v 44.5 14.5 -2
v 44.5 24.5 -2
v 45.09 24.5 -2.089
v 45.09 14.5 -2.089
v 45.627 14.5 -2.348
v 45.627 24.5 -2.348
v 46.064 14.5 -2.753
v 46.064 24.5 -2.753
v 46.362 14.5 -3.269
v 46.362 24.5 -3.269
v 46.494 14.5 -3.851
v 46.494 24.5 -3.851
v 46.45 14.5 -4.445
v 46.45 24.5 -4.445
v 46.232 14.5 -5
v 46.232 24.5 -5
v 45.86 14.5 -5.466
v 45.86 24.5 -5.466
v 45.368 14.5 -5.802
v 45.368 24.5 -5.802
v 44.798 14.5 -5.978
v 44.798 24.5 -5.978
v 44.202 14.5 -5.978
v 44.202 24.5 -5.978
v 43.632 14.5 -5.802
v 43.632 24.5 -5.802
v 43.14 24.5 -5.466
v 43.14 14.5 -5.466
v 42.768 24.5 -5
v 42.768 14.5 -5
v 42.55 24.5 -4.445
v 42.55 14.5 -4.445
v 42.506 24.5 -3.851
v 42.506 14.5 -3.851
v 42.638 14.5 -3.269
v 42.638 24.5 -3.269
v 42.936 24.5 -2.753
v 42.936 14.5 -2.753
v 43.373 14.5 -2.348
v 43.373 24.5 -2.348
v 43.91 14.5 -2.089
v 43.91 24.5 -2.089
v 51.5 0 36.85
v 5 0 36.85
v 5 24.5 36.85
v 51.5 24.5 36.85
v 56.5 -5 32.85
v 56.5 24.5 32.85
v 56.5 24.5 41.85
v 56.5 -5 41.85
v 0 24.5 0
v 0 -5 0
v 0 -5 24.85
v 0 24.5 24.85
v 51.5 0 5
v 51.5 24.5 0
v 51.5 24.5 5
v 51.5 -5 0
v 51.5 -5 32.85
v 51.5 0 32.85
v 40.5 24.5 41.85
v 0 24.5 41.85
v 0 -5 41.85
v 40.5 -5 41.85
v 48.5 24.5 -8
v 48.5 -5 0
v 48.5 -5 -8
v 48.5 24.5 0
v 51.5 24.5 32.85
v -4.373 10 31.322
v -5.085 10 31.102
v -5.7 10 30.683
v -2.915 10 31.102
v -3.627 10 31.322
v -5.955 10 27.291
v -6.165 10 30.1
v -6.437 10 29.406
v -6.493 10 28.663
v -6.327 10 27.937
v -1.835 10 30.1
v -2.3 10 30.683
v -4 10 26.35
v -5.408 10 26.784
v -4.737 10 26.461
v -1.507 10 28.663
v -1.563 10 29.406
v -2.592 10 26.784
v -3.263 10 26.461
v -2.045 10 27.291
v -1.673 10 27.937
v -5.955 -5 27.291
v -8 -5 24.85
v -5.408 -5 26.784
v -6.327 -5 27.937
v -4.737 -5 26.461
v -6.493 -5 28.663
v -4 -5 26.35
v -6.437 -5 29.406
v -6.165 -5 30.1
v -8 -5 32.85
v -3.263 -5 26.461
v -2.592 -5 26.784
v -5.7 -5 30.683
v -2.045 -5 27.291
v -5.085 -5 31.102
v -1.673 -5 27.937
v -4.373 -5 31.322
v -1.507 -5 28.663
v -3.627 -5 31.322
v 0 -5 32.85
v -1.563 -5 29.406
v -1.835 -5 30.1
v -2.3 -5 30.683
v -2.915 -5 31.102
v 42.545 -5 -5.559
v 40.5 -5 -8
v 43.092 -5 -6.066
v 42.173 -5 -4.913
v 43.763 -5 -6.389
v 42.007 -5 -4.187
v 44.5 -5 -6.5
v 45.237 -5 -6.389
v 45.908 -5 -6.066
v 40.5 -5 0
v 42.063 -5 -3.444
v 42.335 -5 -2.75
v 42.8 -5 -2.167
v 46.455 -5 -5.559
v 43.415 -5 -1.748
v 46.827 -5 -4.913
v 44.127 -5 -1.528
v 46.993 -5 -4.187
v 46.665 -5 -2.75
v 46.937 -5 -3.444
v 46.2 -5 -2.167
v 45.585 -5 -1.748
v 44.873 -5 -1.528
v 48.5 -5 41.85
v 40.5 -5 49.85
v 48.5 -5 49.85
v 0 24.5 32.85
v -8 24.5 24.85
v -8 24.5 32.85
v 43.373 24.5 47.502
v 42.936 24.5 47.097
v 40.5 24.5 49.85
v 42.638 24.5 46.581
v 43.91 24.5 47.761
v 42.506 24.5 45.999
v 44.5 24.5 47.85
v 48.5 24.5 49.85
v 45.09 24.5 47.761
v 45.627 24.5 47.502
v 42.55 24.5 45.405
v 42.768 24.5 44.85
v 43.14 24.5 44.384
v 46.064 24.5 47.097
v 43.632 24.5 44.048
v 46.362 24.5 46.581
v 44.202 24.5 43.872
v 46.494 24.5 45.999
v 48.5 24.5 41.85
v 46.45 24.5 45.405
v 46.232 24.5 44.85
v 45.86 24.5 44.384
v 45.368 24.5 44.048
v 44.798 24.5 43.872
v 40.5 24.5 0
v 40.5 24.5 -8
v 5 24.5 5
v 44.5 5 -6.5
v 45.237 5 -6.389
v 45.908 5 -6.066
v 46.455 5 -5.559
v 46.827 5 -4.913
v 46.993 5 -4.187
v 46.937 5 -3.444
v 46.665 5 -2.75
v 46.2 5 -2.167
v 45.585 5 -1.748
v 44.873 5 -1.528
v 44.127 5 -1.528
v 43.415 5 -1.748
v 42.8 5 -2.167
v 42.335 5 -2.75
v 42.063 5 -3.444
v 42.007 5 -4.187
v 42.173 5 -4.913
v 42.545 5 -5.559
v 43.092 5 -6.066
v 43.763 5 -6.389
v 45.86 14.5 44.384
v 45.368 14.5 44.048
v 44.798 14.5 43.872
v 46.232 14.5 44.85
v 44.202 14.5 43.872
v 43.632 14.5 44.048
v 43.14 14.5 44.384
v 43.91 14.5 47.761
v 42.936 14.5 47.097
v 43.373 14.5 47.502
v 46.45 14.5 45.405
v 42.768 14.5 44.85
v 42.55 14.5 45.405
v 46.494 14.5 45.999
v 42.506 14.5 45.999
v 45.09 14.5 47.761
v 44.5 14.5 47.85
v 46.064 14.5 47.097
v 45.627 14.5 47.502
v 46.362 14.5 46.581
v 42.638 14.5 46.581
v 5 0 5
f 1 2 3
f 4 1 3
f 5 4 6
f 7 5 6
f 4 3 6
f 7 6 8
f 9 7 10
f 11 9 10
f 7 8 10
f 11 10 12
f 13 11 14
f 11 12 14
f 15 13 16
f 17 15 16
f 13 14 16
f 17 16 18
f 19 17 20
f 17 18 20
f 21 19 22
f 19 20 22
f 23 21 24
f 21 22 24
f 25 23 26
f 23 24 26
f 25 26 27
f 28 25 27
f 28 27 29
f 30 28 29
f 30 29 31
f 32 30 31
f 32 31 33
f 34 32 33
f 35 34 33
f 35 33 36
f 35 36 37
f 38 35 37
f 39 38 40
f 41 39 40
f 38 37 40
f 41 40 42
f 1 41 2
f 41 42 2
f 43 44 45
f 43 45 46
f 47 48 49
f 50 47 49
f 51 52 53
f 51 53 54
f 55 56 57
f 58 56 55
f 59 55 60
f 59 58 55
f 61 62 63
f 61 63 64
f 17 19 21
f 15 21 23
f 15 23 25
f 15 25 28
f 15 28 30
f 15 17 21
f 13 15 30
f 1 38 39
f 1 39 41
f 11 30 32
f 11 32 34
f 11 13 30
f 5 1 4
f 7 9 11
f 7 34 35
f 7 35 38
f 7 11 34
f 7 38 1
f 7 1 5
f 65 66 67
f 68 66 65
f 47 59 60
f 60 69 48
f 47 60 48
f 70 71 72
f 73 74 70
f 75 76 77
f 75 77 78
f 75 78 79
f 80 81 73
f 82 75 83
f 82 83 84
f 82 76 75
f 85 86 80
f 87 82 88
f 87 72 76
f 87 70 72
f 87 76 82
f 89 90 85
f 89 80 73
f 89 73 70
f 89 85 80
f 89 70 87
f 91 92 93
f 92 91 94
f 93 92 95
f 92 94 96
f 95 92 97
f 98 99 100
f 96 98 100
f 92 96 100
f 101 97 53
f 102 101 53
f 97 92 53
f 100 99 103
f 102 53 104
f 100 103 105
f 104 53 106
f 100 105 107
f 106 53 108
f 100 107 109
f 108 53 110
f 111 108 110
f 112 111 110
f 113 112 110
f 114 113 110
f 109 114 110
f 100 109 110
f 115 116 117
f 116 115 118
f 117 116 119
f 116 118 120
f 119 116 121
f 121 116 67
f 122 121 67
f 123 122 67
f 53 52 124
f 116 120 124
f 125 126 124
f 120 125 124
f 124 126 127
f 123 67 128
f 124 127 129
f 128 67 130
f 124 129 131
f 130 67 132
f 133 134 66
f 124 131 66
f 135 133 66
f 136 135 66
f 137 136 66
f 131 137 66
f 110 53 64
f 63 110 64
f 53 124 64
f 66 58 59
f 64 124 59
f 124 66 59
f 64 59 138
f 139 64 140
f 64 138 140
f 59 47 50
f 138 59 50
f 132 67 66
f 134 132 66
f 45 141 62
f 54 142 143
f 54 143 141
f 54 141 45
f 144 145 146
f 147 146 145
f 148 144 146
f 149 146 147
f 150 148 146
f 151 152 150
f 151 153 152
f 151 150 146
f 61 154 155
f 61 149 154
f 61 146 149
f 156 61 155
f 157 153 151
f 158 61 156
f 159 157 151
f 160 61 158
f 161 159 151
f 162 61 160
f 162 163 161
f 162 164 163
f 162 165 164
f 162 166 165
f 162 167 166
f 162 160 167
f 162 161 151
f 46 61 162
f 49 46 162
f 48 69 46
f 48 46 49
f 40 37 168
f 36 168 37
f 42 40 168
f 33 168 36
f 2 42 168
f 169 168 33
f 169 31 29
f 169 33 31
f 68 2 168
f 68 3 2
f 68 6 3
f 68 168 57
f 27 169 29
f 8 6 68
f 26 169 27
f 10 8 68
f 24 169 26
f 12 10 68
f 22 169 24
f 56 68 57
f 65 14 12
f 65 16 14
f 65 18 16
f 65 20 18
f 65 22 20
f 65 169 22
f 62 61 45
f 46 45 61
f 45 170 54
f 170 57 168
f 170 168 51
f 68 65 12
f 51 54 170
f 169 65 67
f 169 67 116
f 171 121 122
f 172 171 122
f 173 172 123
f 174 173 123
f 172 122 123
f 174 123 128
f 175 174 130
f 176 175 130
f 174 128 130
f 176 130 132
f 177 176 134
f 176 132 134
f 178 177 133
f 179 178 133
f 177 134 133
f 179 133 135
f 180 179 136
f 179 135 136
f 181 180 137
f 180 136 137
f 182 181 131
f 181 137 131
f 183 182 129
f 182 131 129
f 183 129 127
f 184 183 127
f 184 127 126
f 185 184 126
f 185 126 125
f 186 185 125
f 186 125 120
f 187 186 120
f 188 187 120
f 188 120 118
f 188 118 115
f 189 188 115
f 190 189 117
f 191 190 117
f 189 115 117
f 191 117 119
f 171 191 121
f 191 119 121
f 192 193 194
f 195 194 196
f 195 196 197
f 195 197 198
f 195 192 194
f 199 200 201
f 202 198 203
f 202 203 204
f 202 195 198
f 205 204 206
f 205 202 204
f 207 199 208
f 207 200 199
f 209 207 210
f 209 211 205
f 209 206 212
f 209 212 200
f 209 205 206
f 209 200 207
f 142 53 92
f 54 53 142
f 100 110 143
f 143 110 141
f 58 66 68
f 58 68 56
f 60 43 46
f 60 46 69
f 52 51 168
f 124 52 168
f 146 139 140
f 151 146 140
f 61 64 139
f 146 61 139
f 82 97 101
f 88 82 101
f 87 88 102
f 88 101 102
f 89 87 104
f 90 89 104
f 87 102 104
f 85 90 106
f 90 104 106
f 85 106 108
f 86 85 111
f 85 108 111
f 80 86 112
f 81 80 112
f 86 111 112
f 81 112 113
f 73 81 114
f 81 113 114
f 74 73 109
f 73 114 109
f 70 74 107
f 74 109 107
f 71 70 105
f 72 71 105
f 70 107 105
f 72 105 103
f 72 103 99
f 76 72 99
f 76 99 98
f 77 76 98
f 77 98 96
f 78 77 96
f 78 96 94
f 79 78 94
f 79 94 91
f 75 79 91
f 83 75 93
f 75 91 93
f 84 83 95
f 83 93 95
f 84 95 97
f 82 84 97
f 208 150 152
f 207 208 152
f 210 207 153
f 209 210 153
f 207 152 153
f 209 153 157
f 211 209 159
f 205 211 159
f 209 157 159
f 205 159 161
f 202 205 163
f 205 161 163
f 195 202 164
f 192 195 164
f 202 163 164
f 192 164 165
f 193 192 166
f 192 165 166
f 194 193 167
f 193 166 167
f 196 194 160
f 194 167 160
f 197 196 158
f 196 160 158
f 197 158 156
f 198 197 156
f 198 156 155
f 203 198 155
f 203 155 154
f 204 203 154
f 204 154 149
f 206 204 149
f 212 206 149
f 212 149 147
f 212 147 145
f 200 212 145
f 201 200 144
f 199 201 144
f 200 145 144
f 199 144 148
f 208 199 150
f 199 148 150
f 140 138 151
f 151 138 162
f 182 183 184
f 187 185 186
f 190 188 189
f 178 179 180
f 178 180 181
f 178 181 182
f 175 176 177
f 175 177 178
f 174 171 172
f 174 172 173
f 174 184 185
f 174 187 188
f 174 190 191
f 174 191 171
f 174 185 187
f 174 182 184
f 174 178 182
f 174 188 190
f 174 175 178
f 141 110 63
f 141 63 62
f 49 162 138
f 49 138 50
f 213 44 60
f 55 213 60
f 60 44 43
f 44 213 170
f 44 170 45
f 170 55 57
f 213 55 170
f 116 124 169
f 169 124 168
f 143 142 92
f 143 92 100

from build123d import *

# Parameters (mm, degrees)
BOSS_EXTRUDE1_DEPTH  = 24.5
SKETCH2_W            = 103
SKETCH2_H            = 41.85
BOSS_EXTRUDE2_DEPTH  = 5
SKETCH3_W            = 46.5
SKETCH3_H            = 27.85
CUT_EXTRUDE1_DEPTH   = 26
SKETCH7_W            = 8
SKETCH7_H            = 3
BOSS_EXTRUDE3_DEPTH  = 8
SKETCH8_R            = 2.5
CUT_EXTRUDE2_DEPTH   = 8
SKETCH9_W            = 8
SKETCH9_H            = 3
BOSS_EXTRUDE4_DEPTH  = 8
SKETCH10_R           = 2.5
CUT_EXTRUDE3_DEPTH   = 8
SKETCH12_W           = 11.5
SKETCH12_H           = 5
CUT_EXTRUDE4_DEPTH   = 8
SKETCH14_W           = 8
SKETCH14_H           = 3
BOSS_EXTRUDE5_DEPTH  = 8
SKETCH15_R           = 2.5
CUT_EXTRUDE5_DEPTH   = 8
SKETCH16_W           = 8
SKETCH16_H           = 29.5
BOSS_EXTRUDE6_DEPTH  = 8
SKETCH17_W           = 14
SKETCH17_H           = 29.5
BOSS_EXTRUDE7_DEPTH  = 8
SKETCH18_R           = 2
CUT_EXTRUDE6_DEPTH   = 10
SKETCH19_W           = 8
SKETCH19_H           = 29.5
BOSS_EXTRUDE8_DEPTH  = 8
SKETCH20_W           = 13
SKETCH20_H           = 13
BOSS_EXTRUDE9_DEPTH  = 88
CUT_EXTRUDE8_DEPTH   = 48
SKETCH23_R           = 2.5
CUT_EXTRUDE9_DEPTH   = 10
SKETCH25_W           = 8
SKETCH25_H           = 3
CUT_EXTRUDE10_DEPTH  = 8
SKETCH27_W           = 8
SKETCH27_H           = 29.5
BOSS_EXTRUDE11_DEPTH = 8
SKETCH28_R           = 2.5
CUT_EXTRUDE12_DEPTH  = 15
SKETCH29_W           = 13
SKETCH29_H           = 13
CUT_EXTRUDE13_DEPTH  = 88
SKETCH30_W           = 14
SKETCH30_H           = 8
CUT_EXTRUDE14_DEPTH  = 147


with BuildPart() as part:
    # Sketch1 → Boss-Extrude1 (new body)
    with BuildSketch(Plane(origin=(0, 0, 0), x_dir=(1, 0, 0), z_dir=(0, 1, 0))):
        Polygon((0, 0), (51.5, 0), (51.5, -5), (5, -5), (5, -36.85), (51.5, -36.85), (51.5, -32.85), (56.5, -32.85), (56.5, -41.85), (0, -41.85), align=None)
    extrude(amount=BOSS_EXTRUDE1_DEPTH)

    # Sketch2 → Boss-Extrude2 (add)
    with BuildSketch(Plane.XZ):
        with Locations((51.5, 20.925)):
            Rectangle(SKETCH2_W, SKETCH2_H)
    extrude(amount=BOSS_EXTRUDE2_DEPTH)

    # Sketch3 → Cut-Extrude1 (cut)
    with BuildSketch(Plane(origin=(0, 0, 0), x_dir=(1, 0, 0), z_dir=(0, 1, 0))):
        with Locations((74.75, -18.925)):
            Rectangle(SKETCH3_W, SKETCH3_H)
    extrude(amount=-CUT_EXTRUDE1_DEPTH, mode=Mode.SUBTRACT)

    # Sketch7 → Boss-Extrude3 (add)
    with BuildSketch(Plane.XY.offset(41.85)):
        with Locations((4, -3.5)):
            Rectangle(SKETCH7_W, SKETCH7_H)
    extrude(amount=BOSS_EXTRUDE3_DEPTH)

    # Sketch8 → Cut-Extrude2 (cut)
    with BuildSketch(Plane(origin=(0, -2, 0), x_dir=(1, 0, 0), z_dir=(0, 1, 0))):
        with Locations(Location((4, -45.85, 0), (0, 0, 270))):
            Circle(SKETCH8_R)
    extrude(amount=-CUT_EXTRUDE2_DEPTH, mode=Mode.SUBTRACT)

    # Sketch9 → Boss-Extrude4 (add)
    with BuildSketch(Plane(origin=(0, 0, 0), x_dir=(-1, 0, 0), z_dir=(0, 0, -1))):
        with Locations((-99, -3.5)):
            Rectangle(SKETCH9_W, SKETCH9_H)
    extrude(amount=BOSS_EXTRUDE4_DEPTH)

    # Sketch10 → Cut-Extrude3 (cut)
    with BuildSketch(Plane(origin=(0, -2, 0), x_dir=(1, 0, 0), z_dir=(0, 1, 0))):
        with Locations(Location((99, 3.996680608, 0), (0, 0, 270))):
            Circle(SKETCH10_R)
    extrude(amount=-CUT_EXTRUDE3_DEPTH, mode=Mode.SUBTRACT)

    # Sketch12 → Cut-Extrude4 (cut)
    with BuildSketch(Plane(origin=(0, 0, 0), x_dir=(1, 0, 0), z_dir=(0, 1, 0))):
        with Locations((89.25, -2.5)):
            Rectangle(SKETCH12_W, SKETCH12_H)
    extrude(amount=-CUT_EXTRUDE4_DEPTH, mode=Mode.SUBTRACT)

    # Sketch14 → Boss-Extrude5 (add)
    with BuildSketch(Plane(origin=(0, 0, 0), x_dir=(-1, 0, 0), z_dir=(0, 0, -1))):
        with Locations((-79.5, -3.5)):
            Rectangle(SKETCH14_W, SKETCH14_H)
    extrude(amount=BOSS_EXTRUDE5_DEPTH)

    # Sketch15 → Cut-Extrude5 (cut)
    with BuildSketch(Plane(origin=(0, -2, 0), x_dir=(1, 0, 0), z_dir=(0, 1, 0))):
        with Locations(Location((79.5, 4, 0), (0, 0, 270))):
            Circle(SKETCH15_R)
    extrude(amount=-CUT_EXTRUDE5_DEPTH, mode=Mode.SUBTRACT)

    # Sketch16 → Boss-Extrude6 (add)
    with BuildSketch(Plane(origin=(0, 0, 0), x_dir=(-1, 0, 0), z_dir=(0, 0, -1))):
        with Locations((-44.5, 9.75)):
            Rectangle(SKETCH16_W, SKETCH16_H)
    extrude(amount=BOSS_EXTRUDE6_DEPTH)

    # Sketch17 → Boss-Extrude7 (add)
    with BuildSketch(Plane.XY.offset(41.85)):
        with Locations((41.5, 9.75)):
            Rectangle(SKETCH17_W, SKETCH17_H)
    extrude(amount=BOSS_EXTRUDE7_DEPTH)

    # Sketch18 → Cut-Extrude6 (cut)
    with BuildSketch(Plane(origin=(0, 24.5, 0), x_dir=(1, 0, 0), z_dir=(0, 1, 0))):
        with Locations(Location((44.5, 4, 0), (0, 0, 270))):
            Circle(SKETCH18_R)
        with Locations(Location((44.5, -45.85, 0), (0, 0, 270))):
            Circle(SKETCH18_R)
    extrude(amount=-CUT_EXTRUDE6_DEPTH, mode=Mode.SUBTRACT)

    # Sketch19 → Boss-Extrude8 (add)
    with BuildSketch(Plane.ZY.offset(-34.5)):
        with Locations((45.85, 9.75)):
            Rectangle(SKETCH19_W, SKETCH19_H)
    extrude(amount=BOSS_EXTRUDE8_DEPTH)

    # Sketch20 → Boss-Extrude9 (add)
    with BuildSketch(Plane(origin=(0, 24.5, 0), x_dir=(1, 0, 0), z_dir=(0, 1, 0))):
        with Locations((33, -43.35)):
            Rectangle(SKETCH20_W, SKETCH20_H)
    extrude(amount=BOSS_EXTRUDE9_DEPTH)

    # Sketch22 → Cut-Extrude8 (cut)
    with BuildSketch(Plane(origin=(0, 0, 0), x_dir=(1, 0, 0), z_dir=(0, 1, 0))):
        Polygon((103, 0), (103, 8), (51.5, 8), (51.5, -32.85), (56.5, -32.85), (98, -32.85), (98, -5), (95, -5), (95, 0), align=None)
        Polygon((103, -41.85), (103, -32.85), (98, -32.85), (56.5, -32.85), (56.5, -41.85), align=None)
        Polygon((103, -32.85), (103, 0), (95, 0), (95, -5), (98, -5), (98, -32.85), align=None)
    extrude(amount=-CUT_EXTRUDE8_DEPTH, mode=Mode.SUBTRACT)

    # Sketch23 → Cut-Extrude9 (cut)
    with BuildSketch(Plane.XZ.offset(5)):
        with Locations(Location((44.5, -4, 0), (0, 0, 270))):
            Circle(SKETCH23_R)
    extrude(amount=-CUT_EXTRUDE9_DEPTH, mode=Mode.SUBTRACT)

    # Sketch25 → Cut-Extrude10 (cut)
    with BuildSketch(Plane.XY.offset(49.85)):
        with Locations((4, -3.5)):
            Rectangle(SKETCH25_W, SKETCH25_H)
    extrude(amount=-CUT_EXTRUDE10_DEPTH, mode=Mode.SUBTRACT)

    # Sketch27 → Boss-Extrude11 (add)
    with BuildSketch(Plane.ZY):
        with Locations((28.85, 9.75)):
            Rectangle(SKETCH27_W, SKETCH27_H)
    extrude(amount=BOSS_EXTRUDE11_DEPTH)

    # Sketch28 → Cut-Extrude12 (cut)
    with BuildSketch(Plane.XZ.offset(5)):
        with Locations(Location((-4, 28.85, 0), (0, 0, 270))):
            Circle(SKETCH28_R)
    extrude(amount=-CUT_EXTRUDE12_DEPTH, mode=Mode.SUBTRACT)

    # Sketch29 → Cut-Extrude13 (cut)
    with BuildSketch(Plane(origin=(0, 112.5, 0), x_dir=(1, 0, 0), z_dir=(0, 1, 0))):
        with Locations((33, -43.35)):
            Rectangle(SKETCH29_W, SKETCH29_H)
    extrude(amount=-CUT_EXTRUDE13_DEPTH, mode=Mode.SUBTRACT)

    # Sketch30 → Cut-Extrude14 (cut)
    with BuildSketch(Plane.XZ.offset(5)):
        with Locations((33.5, 45.85)):
            Rectangle(SKETCH30_W, SKETCH30_H)
    extrude(amount=-CUT_EXTRUDE14_DEPTH, mode=Mode.SUBTRACT)


solid = part.part
